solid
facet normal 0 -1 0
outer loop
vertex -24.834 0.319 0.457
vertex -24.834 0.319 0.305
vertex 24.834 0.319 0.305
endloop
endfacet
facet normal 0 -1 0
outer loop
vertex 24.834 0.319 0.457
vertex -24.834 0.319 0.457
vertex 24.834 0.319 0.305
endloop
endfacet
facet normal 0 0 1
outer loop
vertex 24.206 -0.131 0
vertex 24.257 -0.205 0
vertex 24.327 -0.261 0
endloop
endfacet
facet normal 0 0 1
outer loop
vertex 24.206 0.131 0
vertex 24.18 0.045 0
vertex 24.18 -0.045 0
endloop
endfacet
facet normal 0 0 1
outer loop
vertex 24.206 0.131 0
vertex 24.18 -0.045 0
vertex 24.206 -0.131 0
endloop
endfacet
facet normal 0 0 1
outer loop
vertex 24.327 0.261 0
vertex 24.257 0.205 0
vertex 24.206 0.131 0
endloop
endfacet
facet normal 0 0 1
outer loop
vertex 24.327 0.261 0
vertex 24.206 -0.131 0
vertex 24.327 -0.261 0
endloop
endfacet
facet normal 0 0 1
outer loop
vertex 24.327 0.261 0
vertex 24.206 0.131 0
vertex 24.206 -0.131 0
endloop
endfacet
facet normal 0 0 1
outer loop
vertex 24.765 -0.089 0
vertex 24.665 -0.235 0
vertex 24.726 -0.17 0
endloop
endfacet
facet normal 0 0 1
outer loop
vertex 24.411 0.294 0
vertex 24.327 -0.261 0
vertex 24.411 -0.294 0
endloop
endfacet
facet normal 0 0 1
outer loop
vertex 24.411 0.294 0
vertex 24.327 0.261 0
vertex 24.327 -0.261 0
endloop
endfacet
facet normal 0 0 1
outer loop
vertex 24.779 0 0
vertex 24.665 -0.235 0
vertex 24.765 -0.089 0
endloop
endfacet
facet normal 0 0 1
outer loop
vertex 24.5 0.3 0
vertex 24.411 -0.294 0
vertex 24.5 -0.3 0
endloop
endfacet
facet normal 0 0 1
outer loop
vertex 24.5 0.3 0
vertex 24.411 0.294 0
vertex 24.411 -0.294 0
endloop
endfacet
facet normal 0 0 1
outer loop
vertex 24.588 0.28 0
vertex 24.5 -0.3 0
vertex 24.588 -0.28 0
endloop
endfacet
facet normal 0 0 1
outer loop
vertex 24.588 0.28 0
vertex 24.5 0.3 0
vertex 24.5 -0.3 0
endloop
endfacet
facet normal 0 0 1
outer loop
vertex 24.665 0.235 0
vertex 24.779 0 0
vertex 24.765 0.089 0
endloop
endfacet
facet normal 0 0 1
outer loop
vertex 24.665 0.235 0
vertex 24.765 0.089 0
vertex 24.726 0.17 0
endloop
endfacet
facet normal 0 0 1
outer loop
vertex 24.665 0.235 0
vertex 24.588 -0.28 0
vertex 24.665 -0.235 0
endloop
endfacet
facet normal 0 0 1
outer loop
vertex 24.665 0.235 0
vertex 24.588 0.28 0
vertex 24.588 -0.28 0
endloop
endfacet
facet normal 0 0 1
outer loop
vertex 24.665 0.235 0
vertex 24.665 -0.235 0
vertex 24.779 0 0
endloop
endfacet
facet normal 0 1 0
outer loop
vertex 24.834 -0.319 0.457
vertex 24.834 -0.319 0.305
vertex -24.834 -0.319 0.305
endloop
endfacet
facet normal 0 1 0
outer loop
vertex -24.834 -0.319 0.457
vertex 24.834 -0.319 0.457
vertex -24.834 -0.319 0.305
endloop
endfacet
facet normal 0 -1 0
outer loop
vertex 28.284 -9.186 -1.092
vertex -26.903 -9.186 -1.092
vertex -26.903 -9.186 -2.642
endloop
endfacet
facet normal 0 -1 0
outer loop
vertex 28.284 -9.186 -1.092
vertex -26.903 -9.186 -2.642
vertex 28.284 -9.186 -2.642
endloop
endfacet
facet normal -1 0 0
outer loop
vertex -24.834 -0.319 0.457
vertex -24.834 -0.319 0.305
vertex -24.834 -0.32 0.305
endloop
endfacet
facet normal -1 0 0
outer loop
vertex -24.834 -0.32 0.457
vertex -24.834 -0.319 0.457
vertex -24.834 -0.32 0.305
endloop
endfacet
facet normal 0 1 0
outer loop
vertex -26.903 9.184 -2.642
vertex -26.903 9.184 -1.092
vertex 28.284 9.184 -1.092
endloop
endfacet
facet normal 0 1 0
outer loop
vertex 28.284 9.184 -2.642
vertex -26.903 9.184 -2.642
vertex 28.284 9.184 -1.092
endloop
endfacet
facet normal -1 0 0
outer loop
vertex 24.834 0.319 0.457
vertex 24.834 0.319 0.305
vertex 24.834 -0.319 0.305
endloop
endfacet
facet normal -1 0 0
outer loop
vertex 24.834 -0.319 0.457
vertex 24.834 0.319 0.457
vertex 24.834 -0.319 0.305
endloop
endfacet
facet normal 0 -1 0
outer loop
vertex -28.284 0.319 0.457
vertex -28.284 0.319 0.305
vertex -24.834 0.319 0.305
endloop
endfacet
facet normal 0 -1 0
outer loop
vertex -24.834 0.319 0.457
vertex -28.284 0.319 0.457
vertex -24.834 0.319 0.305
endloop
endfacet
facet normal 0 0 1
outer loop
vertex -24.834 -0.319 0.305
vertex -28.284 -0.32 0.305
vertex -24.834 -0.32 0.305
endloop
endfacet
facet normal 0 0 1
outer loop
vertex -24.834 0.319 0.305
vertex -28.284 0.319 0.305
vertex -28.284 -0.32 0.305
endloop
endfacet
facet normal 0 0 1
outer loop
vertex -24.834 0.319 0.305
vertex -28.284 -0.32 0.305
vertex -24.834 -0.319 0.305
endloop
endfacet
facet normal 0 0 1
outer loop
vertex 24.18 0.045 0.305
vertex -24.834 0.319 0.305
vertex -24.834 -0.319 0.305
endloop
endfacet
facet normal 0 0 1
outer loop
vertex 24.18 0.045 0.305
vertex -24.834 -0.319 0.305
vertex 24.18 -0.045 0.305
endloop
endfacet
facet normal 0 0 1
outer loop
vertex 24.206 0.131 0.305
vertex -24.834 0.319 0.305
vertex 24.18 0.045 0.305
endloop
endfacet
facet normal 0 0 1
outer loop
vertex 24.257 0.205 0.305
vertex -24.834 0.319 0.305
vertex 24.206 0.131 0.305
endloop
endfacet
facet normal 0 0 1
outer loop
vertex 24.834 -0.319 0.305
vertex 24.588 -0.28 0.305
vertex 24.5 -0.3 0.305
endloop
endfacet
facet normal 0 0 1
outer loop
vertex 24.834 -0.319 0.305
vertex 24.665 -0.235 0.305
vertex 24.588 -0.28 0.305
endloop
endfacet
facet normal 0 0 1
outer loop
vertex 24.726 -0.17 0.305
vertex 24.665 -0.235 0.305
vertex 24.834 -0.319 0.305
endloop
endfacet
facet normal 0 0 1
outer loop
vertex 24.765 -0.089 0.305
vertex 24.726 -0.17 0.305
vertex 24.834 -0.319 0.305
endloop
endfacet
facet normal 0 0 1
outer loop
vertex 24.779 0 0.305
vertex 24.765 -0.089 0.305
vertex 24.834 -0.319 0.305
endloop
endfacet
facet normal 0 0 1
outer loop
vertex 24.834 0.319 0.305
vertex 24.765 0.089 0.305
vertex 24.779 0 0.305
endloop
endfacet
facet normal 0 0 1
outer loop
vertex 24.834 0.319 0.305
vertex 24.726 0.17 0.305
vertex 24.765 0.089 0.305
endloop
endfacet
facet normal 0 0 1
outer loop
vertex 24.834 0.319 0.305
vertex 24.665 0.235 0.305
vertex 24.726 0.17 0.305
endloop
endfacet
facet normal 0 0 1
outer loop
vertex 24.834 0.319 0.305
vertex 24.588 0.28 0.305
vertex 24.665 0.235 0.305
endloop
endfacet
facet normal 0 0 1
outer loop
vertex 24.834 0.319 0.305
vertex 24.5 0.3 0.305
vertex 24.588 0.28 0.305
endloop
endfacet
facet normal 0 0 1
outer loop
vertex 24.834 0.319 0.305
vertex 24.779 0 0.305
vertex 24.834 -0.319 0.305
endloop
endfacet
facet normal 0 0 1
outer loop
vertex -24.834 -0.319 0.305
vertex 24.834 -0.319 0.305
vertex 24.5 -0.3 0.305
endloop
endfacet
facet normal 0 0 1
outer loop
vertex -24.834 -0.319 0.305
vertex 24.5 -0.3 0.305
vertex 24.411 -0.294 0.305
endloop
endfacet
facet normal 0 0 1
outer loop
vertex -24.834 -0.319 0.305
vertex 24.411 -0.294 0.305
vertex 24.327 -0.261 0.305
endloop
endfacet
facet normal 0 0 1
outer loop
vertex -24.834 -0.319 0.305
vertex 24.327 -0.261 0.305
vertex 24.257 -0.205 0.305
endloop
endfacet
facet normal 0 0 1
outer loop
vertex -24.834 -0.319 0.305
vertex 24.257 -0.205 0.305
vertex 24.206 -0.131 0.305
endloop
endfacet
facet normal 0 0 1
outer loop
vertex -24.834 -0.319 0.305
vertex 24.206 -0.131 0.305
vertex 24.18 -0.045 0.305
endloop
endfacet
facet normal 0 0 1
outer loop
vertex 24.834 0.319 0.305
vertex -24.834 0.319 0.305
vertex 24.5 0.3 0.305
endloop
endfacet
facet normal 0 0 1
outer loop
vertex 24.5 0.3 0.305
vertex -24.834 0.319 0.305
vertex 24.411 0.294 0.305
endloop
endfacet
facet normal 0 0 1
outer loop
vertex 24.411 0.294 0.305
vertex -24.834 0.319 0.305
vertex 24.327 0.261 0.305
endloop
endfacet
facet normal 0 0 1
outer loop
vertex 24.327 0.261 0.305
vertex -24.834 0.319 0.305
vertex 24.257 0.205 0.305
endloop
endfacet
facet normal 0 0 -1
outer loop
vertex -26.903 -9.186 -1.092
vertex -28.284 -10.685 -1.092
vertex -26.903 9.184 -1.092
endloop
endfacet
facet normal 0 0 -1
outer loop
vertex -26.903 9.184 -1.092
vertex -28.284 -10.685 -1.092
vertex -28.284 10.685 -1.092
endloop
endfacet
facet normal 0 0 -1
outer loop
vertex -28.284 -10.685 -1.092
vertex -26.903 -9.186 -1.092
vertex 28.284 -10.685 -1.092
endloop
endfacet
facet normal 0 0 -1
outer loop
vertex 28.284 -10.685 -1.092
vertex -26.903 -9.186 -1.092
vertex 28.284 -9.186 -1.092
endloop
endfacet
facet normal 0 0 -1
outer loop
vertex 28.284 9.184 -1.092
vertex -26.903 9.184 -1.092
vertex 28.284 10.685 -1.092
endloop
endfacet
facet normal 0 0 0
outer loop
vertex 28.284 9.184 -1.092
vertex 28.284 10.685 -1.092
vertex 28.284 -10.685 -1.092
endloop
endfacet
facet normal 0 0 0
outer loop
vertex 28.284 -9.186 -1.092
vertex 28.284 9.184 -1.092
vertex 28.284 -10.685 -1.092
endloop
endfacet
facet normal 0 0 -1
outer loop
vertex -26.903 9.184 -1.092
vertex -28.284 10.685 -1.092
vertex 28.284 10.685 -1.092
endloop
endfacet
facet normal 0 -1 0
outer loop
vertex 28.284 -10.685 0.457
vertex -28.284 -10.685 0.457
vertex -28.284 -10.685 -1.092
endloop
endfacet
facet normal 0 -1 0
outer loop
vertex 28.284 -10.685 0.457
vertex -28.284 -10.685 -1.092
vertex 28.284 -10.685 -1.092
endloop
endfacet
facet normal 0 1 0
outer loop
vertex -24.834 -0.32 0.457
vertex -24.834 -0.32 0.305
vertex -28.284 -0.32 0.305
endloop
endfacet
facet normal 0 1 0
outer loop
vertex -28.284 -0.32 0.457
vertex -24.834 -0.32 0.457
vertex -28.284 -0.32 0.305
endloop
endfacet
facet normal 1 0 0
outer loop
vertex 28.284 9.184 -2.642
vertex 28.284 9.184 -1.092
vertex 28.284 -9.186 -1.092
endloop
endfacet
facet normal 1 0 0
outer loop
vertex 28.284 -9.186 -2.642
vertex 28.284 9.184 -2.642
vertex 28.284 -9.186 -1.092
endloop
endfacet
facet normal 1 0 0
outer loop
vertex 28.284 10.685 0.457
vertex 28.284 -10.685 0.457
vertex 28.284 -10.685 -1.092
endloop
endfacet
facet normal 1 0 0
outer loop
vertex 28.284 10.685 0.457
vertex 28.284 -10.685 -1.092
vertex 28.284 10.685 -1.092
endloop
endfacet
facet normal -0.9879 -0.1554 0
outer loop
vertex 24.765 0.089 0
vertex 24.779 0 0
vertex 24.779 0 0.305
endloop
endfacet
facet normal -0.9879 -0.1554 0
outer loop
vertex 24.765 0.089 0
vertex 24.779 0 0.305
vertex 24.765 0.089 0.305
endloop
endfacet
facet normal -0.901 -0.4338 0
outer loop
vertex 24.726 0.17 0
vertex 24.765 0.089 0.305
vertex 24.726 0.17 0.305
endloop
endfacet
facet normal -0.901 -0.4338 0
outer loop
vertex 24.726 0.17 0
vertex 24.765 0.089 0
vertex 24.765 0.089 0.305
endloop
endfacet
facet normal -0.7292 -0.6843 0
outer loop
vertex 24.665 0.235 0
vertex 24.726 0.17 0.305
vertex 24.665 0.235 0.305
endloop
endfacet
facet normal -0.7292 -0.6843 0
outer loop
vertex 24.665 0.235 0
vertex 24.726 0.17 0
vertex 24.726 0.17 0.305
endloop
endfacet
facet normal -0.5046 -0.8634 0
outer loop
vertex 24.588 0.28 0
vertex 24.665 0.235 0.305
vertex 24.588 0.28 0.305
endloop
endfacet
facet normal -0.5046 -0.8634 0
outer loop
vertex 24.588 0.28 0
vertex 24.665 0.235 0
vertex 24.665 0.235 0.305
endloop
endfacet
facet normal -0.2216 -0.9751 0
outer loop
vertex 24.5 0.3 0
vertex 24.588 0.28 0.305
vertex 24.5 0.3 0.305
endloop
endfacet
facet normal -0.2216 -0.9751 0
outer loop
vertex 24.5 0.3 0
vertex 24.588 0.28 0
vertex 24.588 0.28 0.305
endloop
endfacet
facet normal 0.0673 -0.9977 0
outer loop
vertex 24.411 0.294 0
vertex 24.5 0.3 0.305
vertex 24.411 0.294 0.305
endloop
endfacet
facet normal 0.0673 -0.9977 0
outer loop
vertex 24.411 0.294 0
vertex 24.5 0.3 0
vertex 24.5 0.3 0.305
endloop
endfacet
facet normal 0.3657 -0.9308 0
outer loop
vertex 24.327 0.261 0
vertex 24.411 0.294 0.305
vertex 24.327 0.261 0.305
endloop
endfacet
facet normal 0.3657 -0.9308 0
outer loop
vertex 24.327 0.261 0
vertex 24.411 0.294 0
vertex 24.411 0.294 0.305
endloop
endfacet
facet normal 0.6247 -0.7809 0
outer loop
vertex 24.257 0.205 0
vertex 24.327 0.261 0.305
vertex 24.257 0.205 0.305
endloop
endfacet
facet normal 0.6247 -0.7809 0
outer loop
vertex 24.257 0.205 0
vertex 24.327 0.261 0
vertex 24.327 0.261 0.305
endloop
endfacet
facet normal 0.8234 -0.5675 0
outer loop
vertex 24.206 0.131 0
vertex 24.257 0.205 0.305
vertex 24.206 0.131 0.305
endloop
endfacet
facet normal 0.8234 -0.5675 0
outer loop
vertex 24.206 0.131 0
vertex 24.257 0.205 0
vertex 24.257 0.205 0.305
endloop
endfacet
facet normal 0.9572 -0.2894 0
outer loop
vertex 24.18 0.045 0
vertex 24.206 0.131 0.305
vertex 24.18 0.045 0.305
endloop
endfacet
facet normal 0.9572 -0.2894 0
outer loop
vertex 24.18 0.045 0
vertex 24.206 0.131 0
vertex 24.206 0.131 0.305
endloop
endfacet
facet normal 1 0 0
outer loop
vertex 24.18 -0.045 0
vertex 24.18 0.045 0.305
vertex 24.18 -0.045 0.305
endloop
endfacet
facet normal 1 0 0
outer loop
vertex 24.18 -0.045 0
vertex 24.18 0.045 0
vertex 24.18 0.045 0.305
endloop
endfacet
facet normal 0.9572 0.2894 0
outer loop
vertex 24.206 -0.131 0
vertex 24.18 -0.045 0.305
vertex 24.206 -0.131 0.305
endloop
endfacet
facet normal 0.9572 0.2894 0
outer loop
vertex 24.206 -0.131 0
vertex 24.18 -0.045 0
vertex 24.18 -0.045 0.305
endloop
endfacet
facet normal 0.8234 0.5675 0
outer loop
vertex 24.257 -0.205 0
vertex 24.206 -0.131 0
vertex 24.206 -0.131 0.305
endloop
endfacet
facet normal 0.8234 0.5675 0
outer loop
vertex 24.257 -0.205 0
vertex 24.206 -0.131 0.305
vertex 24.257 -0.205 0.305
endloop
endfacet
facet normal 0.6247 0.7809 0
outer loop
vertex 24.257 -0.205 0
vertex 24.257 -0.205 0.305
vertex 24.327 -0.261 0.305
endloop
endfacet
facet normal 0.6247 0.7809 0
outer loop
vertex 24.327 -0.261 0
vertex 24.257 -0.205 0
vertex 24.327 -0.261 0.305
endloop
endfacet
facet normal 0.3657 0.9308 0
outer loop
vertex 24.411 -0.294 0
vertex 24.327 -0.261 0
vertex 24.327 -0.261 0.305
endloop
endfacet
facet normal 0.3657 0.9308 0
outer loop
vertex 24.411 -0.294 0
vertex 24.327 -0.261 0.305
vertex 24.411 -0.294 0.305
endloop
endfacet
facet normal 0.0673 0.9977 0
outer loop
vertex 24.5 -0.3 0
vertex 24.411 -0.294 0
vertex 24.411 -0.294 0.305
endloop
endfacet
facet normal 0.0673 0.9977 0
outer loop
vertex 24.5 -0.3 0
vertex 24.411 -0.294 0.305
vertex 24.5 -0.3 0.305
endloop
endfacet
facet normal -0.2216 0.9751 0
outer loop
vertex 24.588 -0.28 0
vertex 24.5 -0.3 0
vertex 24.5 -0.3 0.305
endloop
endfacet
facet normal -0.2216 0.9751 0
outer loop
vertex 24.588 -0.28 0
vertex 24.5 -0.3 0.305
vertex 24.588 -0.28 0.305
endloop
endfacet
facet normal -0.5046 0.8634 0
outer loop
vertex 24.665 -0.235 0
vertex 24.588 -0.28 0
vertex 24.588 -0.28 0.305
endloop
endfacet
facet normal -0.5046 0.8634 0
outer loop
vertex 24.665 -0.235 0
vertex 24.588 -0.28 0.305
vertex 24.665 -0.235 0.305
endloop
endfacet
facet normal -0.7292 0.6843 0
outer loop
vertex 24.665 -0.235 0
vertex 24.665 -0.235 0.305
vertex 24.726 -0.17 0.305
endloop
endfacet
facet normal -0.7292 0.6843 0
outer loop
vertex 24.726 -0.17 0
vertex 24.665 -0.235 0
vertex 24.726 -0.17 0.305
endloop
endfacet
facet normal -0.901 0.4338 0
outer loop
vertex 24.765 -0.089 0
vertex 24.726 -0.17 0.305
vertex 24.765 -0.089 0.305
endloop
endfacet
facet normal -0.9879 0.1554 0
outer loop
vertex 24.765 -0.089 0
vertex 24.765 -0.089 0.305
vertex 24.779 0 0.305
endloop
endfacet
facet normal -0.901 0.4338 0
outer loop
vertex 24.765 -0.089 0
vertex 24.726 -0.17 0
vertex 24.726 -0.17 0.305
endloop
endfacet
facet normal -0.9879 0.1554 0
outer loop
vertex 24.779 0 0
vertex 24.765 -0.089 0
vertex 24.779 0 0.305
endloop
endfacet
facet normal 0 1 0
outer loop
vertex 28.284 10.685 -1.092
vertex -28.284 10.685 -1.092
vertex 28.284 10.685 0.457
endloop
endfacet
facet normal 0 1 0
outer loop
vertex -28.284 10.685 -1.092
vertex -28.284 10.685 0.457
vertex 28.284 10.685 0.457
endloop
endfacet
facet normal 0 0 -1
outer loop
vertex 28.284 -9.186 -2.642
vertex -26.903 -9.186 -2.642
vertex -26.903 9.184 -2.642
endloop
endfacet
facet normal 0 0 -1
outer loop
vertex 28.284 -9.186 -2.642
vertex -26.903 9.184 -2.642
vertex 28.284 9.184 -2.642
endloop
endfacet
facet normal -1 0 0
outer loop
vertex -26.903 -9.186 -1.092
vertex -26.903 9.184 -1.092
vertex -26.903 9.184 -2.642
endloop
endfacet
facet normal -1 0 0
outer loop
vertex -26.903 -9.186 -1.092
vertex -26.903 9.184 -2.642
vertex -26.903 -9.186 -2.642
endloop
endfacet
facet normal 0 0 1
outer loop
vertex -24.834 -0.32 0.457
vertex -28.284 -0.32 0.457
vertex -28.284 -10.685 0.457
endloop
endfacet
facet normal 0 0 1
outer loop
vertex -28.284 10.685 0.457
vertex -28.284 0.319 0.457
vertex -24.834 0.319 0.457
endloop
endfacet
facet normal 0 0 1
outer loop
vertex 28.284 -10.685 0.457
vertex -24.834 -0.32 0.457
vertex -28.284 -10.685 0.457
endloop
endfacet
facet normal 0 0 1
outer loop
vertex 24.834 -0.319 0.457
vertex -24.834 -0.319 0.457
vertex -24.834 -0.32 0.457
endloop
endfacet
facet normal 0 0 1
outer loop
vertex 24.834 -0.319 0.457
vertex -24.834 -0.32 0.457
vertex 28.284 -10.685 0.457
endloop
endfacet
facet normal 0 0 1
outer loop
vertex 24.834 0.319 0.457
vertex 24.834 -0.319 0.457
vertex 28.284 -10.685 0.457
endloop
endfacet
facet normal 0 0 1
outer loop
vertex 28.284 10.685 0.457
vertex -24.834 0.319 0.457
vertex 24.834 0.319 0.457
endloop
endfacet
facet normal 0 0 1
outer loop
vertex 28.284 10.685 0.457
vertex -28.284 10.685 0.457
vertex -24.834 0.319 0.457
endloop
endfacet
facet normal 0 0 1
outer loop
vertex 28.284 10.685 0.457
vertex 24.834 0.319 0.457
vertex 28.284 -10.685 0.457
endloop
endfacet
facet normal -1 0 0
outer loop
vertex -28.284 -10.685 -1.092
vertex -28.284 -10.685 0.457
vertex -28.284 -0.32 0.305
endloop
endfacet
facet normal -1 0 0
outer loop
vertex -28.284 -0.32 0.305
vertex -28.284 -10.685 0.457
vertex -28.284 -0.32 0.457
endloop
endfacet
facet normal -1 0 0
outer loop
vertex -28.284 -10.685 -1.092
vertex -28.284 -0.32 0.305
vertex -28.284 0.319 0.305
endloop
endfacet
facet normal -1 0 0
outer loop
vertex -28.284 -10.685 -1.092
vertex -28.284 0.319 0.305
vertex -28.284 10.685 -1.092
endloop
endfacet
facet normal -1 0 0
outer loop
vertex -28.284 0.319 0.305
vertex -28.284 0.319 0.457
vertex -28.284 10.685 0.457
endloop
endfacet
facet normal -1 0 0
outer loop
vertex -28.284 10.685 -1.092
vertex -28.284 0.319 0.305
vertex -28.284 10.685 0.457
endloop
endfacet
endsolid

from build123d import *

# Parameters (mm, degrees)
F6_W     = 56.56732
F6_H     = 21.370728
F6_R     = 0.301175
F7_DEPTH = 0.3048
F8_DEPTH = 0.1524
F5_W     = 56.56732
F5_H     = 21.370728
F9_DEPTH = 1.0922
F3_W     = 55.18673
F3_H     = 18.370153
F4_DEPTH = 1.5494


with BuildPart() as f7:
    # F6 (on face) → F7 (new body)
    with BuildSketch(Plane.XY):
        Rectangle(F6_W, F6_H)
        with Locations((24.477545, 0)):
            Circle(F6_R, mode=Mode.SUBTRACT)
    extrude(amount=F7_DEPTH)

    # F1 (on face) → F8 (join)
    with BuildSketch(Plane.XY.offset(0.3048)):
        Polygon((-24.833549, -0.31923), (-24.833549, -0.319519), (-28.28366, -0.319519), (-28.28366, -10.685364), (28.28366, -10.685364), (28.28366, 10.685364), (-28.28366, 10.685364), (-28.28366, 0.318926), (-24.833655, 0.318926), (-24.833655, 0.31923), (24.833655, 0.31923), (24.833655, -0.31923), align=None)
    extrude(amount=F8_DEPTH)

    # F5 (on Top) → F9 (join)
    with BuildSketch(Plane.XY):
        Rectangle(F5_W, F5_H)
    extrude(amount=-F9_DEPTH)

    # F3 (on face) → F4 (join)
    with BuildSketch(Plane(origin=(0, 0, -1.0922), x_dir=(1, 0, 0), z_dir=(0, 0, -1))):
        with Locations((0.690263, 0.001336)):
            Rectangle(F3_W, F3_H)
    extrude(amount=F4_DEPTH)


solid = f7.part
